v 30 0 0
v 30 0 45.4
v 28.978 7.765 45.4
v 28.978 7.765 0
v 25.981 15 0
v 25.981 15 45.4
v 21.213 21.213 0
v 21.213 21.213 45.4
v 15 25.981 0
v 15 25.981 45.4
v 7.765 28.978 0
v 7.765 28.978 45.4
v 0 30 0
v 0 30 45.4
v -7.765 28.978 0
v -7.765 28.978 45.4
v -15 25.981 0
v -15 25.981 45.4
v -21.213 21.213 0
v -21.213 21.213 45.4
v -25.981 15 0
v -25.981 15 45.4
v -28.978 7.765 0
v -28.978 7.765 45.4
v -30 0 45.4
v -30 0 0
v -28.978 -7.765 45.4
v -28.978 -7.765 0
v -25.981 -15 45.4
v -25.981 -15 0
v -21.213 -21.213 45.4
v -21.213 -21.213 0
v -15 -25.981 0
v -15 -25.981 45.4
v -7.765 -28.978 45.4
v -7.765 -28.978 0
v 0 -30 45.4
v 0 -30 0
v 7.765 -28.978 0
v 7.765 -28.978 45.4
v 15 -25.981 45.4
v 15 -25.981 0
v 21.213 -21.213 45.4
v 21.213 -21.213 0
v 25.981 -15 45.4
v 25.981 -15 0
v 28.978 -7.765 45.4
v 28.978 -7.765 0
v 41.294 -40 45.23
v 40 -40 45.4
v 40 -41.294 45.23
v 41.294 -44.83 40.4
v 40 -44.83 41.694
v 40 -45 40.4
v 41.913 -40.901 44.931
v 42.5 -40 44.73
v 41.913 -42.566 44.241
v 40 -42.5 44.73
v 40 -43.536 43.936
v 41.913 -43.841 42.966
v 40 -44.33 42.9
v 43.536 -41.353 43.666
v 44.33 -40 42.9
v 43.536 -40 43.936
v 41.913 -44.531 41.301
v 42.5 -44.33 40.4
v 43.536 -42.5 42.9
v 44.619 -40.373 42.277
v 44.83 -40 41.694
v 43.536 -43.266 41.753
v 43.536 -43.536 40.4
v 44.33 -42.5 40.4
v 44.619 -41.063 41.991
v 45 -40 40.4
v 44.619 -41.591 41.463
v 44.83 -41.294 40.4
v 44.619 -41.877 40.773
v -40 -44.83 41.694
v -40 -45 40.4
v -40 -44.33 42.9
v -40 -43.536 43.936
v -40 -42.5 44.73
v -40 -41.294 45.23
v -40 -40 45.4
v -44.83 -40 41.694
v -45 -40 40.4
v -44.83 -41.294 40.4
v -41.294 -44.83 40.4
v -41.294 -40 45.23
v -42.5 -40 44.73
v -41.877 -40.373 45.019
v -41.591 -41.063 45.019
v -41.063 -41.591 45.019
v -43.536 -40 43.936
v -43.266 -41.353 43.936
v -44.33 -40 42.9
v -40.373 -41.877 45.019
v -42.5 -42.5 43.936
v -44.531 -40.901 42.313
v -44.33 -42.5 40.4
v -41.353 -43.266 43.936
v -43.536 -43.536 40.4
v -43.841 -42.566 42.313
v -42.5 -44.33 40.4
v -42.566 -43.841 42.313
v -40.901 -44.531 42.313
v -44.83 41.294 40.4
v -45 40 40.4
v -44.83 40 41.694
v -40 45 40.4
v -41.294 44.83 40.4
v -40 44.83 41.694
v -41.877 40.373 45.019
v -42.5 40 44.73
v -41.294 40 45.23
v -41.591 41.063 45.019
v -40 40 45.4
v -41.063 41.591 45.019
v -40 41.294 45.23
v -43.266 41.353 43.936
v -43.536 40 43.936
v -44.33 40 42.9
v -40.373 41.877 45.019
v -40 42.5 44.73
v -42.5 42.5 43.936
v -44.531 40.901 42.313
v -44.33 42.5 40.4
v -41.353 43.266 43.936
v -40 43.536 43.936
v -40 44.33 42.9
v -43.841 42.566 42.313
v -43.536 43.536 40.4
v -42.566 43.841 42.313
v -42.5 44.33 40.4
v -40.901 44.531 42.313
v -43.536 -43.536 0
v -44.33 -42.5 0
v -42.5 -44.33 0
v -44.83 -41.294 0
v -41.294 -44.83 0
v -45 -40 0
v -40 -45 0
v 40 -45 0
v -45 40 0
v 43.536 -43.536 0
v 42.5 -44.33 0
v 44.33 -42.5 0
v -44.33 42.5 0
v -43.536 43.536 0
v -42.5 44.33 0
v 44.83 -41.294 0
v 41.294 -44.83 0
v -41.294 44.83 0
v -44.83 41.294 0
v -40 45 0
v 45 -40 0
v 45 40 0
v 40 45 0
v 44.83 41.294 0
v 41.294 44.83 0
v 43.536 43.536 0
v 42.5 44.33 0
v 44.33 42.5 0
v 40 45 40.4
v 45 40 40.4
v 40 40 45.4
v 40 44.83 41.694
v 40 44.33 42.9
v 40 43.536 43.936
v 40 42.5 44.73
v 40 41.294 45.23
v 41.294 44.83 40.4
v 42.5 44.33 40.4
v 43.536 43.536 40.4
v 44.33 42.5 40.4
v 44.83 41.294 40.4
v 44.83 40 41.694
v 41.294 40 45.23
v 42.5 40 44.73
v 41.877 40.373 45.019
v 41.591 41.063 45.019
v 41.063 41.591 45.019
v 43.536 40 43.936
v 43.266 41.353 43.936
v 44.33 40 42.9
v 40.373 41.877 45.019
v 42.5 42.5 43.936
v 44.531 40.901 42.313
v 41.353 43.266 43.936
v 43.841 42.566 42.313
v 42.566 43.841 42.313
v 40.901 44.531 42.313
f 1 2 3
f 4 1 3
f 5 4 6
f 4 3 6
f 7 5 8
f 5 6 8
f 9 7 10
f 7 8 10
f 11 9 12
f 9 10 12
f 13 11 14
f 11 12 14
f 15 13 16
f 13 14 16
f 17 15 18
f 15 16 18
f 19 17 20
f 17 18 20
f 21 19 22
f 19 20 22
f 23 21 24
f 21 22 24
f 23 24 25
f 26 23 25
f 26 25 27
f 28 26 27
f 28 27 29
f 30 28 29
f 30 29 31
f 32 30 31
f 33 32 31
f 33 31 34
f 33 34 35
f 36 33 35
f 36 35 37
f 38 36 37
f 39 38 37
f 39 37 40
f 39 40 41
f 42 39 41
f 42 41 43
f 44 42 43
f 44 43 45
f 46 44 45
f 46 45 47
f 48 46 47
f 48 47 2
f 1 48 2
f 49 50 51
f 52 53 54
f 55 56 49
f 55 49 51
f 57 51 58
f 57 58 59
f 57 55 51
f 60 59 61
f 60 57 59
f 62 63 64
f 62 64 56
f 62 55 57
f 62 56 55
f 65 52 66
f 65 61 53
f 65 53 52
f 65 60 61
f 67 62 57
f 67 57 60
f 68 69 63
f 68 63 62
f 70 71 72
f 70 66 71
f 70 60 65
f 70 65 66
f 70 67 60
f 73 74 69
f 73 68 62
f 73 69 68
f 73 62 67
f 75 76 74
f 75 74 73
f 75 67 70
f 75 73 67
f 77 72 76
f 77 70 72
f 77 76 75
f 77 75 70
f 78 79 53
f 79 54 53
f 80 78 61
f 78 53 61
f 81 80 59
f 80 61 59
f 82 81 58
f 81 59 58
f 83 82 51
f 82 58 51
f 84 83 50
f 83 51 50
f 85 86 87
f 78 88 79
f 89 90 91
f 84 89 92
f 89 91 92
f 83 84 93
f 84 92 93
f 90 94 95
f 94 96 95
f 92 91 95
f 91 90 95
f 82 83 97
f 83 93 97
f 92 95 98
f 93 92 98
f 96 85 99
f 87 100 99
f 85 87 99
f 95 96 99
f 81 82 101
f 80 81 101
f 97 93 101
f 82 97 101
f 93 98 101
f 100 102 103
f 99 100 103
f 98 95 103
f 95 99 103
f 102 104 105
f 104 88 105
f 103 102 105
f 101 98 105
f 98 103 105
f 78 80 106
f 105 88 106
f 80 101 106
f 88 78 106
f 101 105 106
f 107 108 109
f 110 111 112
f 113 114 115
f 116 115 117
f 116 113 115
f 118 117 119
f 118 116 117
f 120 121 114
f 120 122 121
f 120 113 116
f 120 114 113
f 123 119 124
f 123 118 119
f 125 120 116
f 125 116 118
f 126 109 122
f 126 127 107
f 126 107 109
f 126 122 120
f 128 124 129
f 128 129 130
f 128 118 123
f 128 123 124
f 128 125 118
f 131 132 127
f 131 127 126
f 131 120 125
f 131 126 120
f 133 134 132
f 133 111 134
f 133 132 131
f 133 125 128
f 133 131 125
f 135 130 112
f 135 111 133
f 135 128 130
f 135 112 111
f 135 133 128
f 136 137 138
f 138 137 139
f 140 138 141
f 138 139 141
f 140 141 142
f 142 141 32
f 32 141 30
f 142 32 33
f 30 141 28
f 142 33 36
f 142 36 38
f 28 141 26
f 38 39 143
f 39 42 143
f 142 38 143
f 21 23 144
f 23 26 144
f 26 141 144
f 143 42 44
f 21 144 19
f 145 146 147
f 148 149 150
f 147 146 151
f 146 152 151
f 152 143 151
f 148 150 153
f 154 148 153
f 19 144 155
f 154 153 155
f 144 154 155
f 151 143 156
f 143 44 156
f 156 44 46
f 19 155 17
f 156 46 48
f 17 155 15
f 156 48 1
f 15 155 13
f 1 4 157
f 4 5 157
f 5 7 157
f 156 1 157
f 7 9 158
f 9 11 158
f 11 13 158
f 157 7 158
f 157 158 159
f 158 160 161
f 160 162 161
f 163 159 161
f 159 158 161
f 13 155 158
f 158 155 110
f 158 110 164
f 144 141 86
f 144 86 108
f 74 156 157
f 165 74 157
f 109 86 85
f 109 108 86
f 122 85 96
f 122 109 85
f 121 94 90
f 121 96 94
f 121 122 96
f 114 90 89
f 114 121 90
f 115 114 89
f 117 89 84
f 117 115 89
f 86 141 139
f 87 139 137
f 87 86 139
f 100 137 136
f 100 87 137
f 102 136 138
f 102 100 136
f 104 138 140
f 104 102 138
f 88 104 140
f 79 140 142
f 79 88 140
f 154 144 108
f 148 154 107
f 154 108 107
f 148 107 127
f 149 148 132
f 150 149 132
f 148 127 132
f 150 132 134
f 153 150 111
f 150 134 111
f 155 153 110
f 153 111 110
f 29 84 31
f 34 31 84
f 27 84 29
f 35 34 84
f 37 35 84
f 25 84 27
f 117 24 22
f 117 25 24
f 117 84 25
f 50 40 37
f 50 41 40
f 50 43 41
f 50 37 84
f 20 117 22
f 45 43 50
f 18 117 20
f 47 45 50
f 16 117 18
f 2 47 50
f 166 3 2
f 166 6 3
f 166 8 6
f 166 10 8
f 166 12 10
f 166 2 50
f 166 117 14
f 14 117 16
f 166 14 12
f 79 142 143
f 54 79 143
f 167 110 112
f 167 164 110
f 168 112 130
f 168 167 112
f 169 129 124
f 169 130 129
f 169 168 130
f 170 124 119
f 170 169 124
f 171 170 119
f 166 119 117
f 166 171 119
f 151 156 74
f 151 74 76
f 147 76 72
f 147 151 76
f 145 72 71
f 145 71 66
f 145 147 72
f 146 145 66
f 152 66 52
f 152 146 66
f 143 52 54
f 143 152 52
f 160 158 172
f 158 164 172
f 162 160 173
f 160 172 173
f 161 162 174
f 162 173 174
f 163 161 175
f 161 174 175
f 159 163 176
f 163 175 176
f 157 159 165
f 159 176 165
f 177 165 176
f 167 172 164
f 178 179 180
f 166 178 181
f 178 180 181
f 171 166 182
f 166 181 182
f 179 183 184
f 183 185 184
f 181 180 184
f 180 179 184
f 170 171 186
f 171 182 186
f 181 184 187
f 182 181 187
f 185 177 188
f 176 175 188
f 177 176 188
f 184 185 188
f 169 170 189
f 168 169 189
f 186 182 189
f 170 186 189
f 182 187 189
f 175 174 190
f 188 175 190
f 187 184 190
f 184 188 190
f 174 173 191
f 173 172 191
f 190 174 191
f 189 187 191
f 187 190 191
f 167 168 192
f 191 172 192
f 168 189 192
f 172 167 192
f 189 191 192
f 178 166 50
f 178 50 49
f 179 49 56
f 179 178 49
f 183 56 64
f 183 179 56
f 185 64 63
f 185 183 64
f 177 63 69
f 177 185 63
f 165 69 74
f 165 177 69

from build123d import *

# Parameters (mm, degrees)
F0_W        = 90
F0_H        = 90
F1_DEPTH    = 45.4
F2_R        = 30
F3_DEPTH    = 45.401
F4_R        = 5
F5_T1_DEPTH = 52.9
F5_S5_W     = 5
F5_S5_H     = 5
F5_T6_DEPTH = 5


# Not quite as in the source:
# - a fillet or chamfer that OpenCascade refuses, or shapes differently, is made with other operations: its cross-section is extruded or revolved along the edge and cut away or added


with BuildPart() as f1:
    # F0 (on Top) → F1 (new body)
    with BuildSketch(Plane.XY):
        Rectangle(F0_W, F0_H)
    extrude(amount=F1_DEPTH)

    # F2 (on face) → F3 (cut, through all)
    with BuildSketch(Plane.XY.offset(45.4)):
        Circle(F2_R)
    extrude(amount=-F3_DEPTH, mode=Mode.SUBTRACT)

    # F4
    f4_edges = [f1.edges().sort_by_distance(p)[0] for p in [
        (-45, 45, 22.7),
        (-45, -45, 22.7),
        (45, 45, 22.7),
        (45, 0, 45.4),
        (-45, 0, 45.4),
        (0, 45, 45.4),
        (0, -45, 45.4),
    ]]
    fillet(f4_edges, radius=F4_R)

    # F5: fillet of radius 5 on 1 edges, made by hand

    # F5_s2 → F5_t1 (cut)
    with BuildSketch(Plane.XY.offset(-12.5)):
        with BuildLine():
            ThreePointArc((45, -40), (43.5355339059, -43.5355339059), (40, -45))
            Line((40, -45), (45, -45))
            Line((45, -45), (45, -40))
        make_face()
    extrude(amount=F5_T1_DEPTH, mode=Mode.SUBTRACT)


with BuildPart() as f5_tool4:
    # F5_s5 → F5_t6 (new body)
    with BuildSketch(Plane.YZ.offset(40)):
        with Locations((-42.5, 42.9)):
            Rectangle(F5_S5_W, F5_S5_H)
    extrude(amount=F5_T6_DEPTH)

    # F5_s7 → F5_t8 (revolve, cut)
    with BuildSketch(Plane(origin=(40, -40, 40.4), x_dir=(0, 0.7071067812, -0.7071067812), z_dir=(0, -0.7071067812, -0.7071067812))):
        with BuildLine():
            ThreePointArc((0, -5), (5, 0), (0, 5))
            Line((0, 5), (0, -5))
        make_face()
    revolve(axis=Axis((40, -40, 40.4), (1, 0, 0)), mode=Mode.SUBTRACT)


with BuildPart() as f1_1:
    add(f1.part)

    # F5_t3: cut F5_tool4
    add(f5_tool4.part, mode=Mode.SUBTRACT)


solid = f1_1.part
